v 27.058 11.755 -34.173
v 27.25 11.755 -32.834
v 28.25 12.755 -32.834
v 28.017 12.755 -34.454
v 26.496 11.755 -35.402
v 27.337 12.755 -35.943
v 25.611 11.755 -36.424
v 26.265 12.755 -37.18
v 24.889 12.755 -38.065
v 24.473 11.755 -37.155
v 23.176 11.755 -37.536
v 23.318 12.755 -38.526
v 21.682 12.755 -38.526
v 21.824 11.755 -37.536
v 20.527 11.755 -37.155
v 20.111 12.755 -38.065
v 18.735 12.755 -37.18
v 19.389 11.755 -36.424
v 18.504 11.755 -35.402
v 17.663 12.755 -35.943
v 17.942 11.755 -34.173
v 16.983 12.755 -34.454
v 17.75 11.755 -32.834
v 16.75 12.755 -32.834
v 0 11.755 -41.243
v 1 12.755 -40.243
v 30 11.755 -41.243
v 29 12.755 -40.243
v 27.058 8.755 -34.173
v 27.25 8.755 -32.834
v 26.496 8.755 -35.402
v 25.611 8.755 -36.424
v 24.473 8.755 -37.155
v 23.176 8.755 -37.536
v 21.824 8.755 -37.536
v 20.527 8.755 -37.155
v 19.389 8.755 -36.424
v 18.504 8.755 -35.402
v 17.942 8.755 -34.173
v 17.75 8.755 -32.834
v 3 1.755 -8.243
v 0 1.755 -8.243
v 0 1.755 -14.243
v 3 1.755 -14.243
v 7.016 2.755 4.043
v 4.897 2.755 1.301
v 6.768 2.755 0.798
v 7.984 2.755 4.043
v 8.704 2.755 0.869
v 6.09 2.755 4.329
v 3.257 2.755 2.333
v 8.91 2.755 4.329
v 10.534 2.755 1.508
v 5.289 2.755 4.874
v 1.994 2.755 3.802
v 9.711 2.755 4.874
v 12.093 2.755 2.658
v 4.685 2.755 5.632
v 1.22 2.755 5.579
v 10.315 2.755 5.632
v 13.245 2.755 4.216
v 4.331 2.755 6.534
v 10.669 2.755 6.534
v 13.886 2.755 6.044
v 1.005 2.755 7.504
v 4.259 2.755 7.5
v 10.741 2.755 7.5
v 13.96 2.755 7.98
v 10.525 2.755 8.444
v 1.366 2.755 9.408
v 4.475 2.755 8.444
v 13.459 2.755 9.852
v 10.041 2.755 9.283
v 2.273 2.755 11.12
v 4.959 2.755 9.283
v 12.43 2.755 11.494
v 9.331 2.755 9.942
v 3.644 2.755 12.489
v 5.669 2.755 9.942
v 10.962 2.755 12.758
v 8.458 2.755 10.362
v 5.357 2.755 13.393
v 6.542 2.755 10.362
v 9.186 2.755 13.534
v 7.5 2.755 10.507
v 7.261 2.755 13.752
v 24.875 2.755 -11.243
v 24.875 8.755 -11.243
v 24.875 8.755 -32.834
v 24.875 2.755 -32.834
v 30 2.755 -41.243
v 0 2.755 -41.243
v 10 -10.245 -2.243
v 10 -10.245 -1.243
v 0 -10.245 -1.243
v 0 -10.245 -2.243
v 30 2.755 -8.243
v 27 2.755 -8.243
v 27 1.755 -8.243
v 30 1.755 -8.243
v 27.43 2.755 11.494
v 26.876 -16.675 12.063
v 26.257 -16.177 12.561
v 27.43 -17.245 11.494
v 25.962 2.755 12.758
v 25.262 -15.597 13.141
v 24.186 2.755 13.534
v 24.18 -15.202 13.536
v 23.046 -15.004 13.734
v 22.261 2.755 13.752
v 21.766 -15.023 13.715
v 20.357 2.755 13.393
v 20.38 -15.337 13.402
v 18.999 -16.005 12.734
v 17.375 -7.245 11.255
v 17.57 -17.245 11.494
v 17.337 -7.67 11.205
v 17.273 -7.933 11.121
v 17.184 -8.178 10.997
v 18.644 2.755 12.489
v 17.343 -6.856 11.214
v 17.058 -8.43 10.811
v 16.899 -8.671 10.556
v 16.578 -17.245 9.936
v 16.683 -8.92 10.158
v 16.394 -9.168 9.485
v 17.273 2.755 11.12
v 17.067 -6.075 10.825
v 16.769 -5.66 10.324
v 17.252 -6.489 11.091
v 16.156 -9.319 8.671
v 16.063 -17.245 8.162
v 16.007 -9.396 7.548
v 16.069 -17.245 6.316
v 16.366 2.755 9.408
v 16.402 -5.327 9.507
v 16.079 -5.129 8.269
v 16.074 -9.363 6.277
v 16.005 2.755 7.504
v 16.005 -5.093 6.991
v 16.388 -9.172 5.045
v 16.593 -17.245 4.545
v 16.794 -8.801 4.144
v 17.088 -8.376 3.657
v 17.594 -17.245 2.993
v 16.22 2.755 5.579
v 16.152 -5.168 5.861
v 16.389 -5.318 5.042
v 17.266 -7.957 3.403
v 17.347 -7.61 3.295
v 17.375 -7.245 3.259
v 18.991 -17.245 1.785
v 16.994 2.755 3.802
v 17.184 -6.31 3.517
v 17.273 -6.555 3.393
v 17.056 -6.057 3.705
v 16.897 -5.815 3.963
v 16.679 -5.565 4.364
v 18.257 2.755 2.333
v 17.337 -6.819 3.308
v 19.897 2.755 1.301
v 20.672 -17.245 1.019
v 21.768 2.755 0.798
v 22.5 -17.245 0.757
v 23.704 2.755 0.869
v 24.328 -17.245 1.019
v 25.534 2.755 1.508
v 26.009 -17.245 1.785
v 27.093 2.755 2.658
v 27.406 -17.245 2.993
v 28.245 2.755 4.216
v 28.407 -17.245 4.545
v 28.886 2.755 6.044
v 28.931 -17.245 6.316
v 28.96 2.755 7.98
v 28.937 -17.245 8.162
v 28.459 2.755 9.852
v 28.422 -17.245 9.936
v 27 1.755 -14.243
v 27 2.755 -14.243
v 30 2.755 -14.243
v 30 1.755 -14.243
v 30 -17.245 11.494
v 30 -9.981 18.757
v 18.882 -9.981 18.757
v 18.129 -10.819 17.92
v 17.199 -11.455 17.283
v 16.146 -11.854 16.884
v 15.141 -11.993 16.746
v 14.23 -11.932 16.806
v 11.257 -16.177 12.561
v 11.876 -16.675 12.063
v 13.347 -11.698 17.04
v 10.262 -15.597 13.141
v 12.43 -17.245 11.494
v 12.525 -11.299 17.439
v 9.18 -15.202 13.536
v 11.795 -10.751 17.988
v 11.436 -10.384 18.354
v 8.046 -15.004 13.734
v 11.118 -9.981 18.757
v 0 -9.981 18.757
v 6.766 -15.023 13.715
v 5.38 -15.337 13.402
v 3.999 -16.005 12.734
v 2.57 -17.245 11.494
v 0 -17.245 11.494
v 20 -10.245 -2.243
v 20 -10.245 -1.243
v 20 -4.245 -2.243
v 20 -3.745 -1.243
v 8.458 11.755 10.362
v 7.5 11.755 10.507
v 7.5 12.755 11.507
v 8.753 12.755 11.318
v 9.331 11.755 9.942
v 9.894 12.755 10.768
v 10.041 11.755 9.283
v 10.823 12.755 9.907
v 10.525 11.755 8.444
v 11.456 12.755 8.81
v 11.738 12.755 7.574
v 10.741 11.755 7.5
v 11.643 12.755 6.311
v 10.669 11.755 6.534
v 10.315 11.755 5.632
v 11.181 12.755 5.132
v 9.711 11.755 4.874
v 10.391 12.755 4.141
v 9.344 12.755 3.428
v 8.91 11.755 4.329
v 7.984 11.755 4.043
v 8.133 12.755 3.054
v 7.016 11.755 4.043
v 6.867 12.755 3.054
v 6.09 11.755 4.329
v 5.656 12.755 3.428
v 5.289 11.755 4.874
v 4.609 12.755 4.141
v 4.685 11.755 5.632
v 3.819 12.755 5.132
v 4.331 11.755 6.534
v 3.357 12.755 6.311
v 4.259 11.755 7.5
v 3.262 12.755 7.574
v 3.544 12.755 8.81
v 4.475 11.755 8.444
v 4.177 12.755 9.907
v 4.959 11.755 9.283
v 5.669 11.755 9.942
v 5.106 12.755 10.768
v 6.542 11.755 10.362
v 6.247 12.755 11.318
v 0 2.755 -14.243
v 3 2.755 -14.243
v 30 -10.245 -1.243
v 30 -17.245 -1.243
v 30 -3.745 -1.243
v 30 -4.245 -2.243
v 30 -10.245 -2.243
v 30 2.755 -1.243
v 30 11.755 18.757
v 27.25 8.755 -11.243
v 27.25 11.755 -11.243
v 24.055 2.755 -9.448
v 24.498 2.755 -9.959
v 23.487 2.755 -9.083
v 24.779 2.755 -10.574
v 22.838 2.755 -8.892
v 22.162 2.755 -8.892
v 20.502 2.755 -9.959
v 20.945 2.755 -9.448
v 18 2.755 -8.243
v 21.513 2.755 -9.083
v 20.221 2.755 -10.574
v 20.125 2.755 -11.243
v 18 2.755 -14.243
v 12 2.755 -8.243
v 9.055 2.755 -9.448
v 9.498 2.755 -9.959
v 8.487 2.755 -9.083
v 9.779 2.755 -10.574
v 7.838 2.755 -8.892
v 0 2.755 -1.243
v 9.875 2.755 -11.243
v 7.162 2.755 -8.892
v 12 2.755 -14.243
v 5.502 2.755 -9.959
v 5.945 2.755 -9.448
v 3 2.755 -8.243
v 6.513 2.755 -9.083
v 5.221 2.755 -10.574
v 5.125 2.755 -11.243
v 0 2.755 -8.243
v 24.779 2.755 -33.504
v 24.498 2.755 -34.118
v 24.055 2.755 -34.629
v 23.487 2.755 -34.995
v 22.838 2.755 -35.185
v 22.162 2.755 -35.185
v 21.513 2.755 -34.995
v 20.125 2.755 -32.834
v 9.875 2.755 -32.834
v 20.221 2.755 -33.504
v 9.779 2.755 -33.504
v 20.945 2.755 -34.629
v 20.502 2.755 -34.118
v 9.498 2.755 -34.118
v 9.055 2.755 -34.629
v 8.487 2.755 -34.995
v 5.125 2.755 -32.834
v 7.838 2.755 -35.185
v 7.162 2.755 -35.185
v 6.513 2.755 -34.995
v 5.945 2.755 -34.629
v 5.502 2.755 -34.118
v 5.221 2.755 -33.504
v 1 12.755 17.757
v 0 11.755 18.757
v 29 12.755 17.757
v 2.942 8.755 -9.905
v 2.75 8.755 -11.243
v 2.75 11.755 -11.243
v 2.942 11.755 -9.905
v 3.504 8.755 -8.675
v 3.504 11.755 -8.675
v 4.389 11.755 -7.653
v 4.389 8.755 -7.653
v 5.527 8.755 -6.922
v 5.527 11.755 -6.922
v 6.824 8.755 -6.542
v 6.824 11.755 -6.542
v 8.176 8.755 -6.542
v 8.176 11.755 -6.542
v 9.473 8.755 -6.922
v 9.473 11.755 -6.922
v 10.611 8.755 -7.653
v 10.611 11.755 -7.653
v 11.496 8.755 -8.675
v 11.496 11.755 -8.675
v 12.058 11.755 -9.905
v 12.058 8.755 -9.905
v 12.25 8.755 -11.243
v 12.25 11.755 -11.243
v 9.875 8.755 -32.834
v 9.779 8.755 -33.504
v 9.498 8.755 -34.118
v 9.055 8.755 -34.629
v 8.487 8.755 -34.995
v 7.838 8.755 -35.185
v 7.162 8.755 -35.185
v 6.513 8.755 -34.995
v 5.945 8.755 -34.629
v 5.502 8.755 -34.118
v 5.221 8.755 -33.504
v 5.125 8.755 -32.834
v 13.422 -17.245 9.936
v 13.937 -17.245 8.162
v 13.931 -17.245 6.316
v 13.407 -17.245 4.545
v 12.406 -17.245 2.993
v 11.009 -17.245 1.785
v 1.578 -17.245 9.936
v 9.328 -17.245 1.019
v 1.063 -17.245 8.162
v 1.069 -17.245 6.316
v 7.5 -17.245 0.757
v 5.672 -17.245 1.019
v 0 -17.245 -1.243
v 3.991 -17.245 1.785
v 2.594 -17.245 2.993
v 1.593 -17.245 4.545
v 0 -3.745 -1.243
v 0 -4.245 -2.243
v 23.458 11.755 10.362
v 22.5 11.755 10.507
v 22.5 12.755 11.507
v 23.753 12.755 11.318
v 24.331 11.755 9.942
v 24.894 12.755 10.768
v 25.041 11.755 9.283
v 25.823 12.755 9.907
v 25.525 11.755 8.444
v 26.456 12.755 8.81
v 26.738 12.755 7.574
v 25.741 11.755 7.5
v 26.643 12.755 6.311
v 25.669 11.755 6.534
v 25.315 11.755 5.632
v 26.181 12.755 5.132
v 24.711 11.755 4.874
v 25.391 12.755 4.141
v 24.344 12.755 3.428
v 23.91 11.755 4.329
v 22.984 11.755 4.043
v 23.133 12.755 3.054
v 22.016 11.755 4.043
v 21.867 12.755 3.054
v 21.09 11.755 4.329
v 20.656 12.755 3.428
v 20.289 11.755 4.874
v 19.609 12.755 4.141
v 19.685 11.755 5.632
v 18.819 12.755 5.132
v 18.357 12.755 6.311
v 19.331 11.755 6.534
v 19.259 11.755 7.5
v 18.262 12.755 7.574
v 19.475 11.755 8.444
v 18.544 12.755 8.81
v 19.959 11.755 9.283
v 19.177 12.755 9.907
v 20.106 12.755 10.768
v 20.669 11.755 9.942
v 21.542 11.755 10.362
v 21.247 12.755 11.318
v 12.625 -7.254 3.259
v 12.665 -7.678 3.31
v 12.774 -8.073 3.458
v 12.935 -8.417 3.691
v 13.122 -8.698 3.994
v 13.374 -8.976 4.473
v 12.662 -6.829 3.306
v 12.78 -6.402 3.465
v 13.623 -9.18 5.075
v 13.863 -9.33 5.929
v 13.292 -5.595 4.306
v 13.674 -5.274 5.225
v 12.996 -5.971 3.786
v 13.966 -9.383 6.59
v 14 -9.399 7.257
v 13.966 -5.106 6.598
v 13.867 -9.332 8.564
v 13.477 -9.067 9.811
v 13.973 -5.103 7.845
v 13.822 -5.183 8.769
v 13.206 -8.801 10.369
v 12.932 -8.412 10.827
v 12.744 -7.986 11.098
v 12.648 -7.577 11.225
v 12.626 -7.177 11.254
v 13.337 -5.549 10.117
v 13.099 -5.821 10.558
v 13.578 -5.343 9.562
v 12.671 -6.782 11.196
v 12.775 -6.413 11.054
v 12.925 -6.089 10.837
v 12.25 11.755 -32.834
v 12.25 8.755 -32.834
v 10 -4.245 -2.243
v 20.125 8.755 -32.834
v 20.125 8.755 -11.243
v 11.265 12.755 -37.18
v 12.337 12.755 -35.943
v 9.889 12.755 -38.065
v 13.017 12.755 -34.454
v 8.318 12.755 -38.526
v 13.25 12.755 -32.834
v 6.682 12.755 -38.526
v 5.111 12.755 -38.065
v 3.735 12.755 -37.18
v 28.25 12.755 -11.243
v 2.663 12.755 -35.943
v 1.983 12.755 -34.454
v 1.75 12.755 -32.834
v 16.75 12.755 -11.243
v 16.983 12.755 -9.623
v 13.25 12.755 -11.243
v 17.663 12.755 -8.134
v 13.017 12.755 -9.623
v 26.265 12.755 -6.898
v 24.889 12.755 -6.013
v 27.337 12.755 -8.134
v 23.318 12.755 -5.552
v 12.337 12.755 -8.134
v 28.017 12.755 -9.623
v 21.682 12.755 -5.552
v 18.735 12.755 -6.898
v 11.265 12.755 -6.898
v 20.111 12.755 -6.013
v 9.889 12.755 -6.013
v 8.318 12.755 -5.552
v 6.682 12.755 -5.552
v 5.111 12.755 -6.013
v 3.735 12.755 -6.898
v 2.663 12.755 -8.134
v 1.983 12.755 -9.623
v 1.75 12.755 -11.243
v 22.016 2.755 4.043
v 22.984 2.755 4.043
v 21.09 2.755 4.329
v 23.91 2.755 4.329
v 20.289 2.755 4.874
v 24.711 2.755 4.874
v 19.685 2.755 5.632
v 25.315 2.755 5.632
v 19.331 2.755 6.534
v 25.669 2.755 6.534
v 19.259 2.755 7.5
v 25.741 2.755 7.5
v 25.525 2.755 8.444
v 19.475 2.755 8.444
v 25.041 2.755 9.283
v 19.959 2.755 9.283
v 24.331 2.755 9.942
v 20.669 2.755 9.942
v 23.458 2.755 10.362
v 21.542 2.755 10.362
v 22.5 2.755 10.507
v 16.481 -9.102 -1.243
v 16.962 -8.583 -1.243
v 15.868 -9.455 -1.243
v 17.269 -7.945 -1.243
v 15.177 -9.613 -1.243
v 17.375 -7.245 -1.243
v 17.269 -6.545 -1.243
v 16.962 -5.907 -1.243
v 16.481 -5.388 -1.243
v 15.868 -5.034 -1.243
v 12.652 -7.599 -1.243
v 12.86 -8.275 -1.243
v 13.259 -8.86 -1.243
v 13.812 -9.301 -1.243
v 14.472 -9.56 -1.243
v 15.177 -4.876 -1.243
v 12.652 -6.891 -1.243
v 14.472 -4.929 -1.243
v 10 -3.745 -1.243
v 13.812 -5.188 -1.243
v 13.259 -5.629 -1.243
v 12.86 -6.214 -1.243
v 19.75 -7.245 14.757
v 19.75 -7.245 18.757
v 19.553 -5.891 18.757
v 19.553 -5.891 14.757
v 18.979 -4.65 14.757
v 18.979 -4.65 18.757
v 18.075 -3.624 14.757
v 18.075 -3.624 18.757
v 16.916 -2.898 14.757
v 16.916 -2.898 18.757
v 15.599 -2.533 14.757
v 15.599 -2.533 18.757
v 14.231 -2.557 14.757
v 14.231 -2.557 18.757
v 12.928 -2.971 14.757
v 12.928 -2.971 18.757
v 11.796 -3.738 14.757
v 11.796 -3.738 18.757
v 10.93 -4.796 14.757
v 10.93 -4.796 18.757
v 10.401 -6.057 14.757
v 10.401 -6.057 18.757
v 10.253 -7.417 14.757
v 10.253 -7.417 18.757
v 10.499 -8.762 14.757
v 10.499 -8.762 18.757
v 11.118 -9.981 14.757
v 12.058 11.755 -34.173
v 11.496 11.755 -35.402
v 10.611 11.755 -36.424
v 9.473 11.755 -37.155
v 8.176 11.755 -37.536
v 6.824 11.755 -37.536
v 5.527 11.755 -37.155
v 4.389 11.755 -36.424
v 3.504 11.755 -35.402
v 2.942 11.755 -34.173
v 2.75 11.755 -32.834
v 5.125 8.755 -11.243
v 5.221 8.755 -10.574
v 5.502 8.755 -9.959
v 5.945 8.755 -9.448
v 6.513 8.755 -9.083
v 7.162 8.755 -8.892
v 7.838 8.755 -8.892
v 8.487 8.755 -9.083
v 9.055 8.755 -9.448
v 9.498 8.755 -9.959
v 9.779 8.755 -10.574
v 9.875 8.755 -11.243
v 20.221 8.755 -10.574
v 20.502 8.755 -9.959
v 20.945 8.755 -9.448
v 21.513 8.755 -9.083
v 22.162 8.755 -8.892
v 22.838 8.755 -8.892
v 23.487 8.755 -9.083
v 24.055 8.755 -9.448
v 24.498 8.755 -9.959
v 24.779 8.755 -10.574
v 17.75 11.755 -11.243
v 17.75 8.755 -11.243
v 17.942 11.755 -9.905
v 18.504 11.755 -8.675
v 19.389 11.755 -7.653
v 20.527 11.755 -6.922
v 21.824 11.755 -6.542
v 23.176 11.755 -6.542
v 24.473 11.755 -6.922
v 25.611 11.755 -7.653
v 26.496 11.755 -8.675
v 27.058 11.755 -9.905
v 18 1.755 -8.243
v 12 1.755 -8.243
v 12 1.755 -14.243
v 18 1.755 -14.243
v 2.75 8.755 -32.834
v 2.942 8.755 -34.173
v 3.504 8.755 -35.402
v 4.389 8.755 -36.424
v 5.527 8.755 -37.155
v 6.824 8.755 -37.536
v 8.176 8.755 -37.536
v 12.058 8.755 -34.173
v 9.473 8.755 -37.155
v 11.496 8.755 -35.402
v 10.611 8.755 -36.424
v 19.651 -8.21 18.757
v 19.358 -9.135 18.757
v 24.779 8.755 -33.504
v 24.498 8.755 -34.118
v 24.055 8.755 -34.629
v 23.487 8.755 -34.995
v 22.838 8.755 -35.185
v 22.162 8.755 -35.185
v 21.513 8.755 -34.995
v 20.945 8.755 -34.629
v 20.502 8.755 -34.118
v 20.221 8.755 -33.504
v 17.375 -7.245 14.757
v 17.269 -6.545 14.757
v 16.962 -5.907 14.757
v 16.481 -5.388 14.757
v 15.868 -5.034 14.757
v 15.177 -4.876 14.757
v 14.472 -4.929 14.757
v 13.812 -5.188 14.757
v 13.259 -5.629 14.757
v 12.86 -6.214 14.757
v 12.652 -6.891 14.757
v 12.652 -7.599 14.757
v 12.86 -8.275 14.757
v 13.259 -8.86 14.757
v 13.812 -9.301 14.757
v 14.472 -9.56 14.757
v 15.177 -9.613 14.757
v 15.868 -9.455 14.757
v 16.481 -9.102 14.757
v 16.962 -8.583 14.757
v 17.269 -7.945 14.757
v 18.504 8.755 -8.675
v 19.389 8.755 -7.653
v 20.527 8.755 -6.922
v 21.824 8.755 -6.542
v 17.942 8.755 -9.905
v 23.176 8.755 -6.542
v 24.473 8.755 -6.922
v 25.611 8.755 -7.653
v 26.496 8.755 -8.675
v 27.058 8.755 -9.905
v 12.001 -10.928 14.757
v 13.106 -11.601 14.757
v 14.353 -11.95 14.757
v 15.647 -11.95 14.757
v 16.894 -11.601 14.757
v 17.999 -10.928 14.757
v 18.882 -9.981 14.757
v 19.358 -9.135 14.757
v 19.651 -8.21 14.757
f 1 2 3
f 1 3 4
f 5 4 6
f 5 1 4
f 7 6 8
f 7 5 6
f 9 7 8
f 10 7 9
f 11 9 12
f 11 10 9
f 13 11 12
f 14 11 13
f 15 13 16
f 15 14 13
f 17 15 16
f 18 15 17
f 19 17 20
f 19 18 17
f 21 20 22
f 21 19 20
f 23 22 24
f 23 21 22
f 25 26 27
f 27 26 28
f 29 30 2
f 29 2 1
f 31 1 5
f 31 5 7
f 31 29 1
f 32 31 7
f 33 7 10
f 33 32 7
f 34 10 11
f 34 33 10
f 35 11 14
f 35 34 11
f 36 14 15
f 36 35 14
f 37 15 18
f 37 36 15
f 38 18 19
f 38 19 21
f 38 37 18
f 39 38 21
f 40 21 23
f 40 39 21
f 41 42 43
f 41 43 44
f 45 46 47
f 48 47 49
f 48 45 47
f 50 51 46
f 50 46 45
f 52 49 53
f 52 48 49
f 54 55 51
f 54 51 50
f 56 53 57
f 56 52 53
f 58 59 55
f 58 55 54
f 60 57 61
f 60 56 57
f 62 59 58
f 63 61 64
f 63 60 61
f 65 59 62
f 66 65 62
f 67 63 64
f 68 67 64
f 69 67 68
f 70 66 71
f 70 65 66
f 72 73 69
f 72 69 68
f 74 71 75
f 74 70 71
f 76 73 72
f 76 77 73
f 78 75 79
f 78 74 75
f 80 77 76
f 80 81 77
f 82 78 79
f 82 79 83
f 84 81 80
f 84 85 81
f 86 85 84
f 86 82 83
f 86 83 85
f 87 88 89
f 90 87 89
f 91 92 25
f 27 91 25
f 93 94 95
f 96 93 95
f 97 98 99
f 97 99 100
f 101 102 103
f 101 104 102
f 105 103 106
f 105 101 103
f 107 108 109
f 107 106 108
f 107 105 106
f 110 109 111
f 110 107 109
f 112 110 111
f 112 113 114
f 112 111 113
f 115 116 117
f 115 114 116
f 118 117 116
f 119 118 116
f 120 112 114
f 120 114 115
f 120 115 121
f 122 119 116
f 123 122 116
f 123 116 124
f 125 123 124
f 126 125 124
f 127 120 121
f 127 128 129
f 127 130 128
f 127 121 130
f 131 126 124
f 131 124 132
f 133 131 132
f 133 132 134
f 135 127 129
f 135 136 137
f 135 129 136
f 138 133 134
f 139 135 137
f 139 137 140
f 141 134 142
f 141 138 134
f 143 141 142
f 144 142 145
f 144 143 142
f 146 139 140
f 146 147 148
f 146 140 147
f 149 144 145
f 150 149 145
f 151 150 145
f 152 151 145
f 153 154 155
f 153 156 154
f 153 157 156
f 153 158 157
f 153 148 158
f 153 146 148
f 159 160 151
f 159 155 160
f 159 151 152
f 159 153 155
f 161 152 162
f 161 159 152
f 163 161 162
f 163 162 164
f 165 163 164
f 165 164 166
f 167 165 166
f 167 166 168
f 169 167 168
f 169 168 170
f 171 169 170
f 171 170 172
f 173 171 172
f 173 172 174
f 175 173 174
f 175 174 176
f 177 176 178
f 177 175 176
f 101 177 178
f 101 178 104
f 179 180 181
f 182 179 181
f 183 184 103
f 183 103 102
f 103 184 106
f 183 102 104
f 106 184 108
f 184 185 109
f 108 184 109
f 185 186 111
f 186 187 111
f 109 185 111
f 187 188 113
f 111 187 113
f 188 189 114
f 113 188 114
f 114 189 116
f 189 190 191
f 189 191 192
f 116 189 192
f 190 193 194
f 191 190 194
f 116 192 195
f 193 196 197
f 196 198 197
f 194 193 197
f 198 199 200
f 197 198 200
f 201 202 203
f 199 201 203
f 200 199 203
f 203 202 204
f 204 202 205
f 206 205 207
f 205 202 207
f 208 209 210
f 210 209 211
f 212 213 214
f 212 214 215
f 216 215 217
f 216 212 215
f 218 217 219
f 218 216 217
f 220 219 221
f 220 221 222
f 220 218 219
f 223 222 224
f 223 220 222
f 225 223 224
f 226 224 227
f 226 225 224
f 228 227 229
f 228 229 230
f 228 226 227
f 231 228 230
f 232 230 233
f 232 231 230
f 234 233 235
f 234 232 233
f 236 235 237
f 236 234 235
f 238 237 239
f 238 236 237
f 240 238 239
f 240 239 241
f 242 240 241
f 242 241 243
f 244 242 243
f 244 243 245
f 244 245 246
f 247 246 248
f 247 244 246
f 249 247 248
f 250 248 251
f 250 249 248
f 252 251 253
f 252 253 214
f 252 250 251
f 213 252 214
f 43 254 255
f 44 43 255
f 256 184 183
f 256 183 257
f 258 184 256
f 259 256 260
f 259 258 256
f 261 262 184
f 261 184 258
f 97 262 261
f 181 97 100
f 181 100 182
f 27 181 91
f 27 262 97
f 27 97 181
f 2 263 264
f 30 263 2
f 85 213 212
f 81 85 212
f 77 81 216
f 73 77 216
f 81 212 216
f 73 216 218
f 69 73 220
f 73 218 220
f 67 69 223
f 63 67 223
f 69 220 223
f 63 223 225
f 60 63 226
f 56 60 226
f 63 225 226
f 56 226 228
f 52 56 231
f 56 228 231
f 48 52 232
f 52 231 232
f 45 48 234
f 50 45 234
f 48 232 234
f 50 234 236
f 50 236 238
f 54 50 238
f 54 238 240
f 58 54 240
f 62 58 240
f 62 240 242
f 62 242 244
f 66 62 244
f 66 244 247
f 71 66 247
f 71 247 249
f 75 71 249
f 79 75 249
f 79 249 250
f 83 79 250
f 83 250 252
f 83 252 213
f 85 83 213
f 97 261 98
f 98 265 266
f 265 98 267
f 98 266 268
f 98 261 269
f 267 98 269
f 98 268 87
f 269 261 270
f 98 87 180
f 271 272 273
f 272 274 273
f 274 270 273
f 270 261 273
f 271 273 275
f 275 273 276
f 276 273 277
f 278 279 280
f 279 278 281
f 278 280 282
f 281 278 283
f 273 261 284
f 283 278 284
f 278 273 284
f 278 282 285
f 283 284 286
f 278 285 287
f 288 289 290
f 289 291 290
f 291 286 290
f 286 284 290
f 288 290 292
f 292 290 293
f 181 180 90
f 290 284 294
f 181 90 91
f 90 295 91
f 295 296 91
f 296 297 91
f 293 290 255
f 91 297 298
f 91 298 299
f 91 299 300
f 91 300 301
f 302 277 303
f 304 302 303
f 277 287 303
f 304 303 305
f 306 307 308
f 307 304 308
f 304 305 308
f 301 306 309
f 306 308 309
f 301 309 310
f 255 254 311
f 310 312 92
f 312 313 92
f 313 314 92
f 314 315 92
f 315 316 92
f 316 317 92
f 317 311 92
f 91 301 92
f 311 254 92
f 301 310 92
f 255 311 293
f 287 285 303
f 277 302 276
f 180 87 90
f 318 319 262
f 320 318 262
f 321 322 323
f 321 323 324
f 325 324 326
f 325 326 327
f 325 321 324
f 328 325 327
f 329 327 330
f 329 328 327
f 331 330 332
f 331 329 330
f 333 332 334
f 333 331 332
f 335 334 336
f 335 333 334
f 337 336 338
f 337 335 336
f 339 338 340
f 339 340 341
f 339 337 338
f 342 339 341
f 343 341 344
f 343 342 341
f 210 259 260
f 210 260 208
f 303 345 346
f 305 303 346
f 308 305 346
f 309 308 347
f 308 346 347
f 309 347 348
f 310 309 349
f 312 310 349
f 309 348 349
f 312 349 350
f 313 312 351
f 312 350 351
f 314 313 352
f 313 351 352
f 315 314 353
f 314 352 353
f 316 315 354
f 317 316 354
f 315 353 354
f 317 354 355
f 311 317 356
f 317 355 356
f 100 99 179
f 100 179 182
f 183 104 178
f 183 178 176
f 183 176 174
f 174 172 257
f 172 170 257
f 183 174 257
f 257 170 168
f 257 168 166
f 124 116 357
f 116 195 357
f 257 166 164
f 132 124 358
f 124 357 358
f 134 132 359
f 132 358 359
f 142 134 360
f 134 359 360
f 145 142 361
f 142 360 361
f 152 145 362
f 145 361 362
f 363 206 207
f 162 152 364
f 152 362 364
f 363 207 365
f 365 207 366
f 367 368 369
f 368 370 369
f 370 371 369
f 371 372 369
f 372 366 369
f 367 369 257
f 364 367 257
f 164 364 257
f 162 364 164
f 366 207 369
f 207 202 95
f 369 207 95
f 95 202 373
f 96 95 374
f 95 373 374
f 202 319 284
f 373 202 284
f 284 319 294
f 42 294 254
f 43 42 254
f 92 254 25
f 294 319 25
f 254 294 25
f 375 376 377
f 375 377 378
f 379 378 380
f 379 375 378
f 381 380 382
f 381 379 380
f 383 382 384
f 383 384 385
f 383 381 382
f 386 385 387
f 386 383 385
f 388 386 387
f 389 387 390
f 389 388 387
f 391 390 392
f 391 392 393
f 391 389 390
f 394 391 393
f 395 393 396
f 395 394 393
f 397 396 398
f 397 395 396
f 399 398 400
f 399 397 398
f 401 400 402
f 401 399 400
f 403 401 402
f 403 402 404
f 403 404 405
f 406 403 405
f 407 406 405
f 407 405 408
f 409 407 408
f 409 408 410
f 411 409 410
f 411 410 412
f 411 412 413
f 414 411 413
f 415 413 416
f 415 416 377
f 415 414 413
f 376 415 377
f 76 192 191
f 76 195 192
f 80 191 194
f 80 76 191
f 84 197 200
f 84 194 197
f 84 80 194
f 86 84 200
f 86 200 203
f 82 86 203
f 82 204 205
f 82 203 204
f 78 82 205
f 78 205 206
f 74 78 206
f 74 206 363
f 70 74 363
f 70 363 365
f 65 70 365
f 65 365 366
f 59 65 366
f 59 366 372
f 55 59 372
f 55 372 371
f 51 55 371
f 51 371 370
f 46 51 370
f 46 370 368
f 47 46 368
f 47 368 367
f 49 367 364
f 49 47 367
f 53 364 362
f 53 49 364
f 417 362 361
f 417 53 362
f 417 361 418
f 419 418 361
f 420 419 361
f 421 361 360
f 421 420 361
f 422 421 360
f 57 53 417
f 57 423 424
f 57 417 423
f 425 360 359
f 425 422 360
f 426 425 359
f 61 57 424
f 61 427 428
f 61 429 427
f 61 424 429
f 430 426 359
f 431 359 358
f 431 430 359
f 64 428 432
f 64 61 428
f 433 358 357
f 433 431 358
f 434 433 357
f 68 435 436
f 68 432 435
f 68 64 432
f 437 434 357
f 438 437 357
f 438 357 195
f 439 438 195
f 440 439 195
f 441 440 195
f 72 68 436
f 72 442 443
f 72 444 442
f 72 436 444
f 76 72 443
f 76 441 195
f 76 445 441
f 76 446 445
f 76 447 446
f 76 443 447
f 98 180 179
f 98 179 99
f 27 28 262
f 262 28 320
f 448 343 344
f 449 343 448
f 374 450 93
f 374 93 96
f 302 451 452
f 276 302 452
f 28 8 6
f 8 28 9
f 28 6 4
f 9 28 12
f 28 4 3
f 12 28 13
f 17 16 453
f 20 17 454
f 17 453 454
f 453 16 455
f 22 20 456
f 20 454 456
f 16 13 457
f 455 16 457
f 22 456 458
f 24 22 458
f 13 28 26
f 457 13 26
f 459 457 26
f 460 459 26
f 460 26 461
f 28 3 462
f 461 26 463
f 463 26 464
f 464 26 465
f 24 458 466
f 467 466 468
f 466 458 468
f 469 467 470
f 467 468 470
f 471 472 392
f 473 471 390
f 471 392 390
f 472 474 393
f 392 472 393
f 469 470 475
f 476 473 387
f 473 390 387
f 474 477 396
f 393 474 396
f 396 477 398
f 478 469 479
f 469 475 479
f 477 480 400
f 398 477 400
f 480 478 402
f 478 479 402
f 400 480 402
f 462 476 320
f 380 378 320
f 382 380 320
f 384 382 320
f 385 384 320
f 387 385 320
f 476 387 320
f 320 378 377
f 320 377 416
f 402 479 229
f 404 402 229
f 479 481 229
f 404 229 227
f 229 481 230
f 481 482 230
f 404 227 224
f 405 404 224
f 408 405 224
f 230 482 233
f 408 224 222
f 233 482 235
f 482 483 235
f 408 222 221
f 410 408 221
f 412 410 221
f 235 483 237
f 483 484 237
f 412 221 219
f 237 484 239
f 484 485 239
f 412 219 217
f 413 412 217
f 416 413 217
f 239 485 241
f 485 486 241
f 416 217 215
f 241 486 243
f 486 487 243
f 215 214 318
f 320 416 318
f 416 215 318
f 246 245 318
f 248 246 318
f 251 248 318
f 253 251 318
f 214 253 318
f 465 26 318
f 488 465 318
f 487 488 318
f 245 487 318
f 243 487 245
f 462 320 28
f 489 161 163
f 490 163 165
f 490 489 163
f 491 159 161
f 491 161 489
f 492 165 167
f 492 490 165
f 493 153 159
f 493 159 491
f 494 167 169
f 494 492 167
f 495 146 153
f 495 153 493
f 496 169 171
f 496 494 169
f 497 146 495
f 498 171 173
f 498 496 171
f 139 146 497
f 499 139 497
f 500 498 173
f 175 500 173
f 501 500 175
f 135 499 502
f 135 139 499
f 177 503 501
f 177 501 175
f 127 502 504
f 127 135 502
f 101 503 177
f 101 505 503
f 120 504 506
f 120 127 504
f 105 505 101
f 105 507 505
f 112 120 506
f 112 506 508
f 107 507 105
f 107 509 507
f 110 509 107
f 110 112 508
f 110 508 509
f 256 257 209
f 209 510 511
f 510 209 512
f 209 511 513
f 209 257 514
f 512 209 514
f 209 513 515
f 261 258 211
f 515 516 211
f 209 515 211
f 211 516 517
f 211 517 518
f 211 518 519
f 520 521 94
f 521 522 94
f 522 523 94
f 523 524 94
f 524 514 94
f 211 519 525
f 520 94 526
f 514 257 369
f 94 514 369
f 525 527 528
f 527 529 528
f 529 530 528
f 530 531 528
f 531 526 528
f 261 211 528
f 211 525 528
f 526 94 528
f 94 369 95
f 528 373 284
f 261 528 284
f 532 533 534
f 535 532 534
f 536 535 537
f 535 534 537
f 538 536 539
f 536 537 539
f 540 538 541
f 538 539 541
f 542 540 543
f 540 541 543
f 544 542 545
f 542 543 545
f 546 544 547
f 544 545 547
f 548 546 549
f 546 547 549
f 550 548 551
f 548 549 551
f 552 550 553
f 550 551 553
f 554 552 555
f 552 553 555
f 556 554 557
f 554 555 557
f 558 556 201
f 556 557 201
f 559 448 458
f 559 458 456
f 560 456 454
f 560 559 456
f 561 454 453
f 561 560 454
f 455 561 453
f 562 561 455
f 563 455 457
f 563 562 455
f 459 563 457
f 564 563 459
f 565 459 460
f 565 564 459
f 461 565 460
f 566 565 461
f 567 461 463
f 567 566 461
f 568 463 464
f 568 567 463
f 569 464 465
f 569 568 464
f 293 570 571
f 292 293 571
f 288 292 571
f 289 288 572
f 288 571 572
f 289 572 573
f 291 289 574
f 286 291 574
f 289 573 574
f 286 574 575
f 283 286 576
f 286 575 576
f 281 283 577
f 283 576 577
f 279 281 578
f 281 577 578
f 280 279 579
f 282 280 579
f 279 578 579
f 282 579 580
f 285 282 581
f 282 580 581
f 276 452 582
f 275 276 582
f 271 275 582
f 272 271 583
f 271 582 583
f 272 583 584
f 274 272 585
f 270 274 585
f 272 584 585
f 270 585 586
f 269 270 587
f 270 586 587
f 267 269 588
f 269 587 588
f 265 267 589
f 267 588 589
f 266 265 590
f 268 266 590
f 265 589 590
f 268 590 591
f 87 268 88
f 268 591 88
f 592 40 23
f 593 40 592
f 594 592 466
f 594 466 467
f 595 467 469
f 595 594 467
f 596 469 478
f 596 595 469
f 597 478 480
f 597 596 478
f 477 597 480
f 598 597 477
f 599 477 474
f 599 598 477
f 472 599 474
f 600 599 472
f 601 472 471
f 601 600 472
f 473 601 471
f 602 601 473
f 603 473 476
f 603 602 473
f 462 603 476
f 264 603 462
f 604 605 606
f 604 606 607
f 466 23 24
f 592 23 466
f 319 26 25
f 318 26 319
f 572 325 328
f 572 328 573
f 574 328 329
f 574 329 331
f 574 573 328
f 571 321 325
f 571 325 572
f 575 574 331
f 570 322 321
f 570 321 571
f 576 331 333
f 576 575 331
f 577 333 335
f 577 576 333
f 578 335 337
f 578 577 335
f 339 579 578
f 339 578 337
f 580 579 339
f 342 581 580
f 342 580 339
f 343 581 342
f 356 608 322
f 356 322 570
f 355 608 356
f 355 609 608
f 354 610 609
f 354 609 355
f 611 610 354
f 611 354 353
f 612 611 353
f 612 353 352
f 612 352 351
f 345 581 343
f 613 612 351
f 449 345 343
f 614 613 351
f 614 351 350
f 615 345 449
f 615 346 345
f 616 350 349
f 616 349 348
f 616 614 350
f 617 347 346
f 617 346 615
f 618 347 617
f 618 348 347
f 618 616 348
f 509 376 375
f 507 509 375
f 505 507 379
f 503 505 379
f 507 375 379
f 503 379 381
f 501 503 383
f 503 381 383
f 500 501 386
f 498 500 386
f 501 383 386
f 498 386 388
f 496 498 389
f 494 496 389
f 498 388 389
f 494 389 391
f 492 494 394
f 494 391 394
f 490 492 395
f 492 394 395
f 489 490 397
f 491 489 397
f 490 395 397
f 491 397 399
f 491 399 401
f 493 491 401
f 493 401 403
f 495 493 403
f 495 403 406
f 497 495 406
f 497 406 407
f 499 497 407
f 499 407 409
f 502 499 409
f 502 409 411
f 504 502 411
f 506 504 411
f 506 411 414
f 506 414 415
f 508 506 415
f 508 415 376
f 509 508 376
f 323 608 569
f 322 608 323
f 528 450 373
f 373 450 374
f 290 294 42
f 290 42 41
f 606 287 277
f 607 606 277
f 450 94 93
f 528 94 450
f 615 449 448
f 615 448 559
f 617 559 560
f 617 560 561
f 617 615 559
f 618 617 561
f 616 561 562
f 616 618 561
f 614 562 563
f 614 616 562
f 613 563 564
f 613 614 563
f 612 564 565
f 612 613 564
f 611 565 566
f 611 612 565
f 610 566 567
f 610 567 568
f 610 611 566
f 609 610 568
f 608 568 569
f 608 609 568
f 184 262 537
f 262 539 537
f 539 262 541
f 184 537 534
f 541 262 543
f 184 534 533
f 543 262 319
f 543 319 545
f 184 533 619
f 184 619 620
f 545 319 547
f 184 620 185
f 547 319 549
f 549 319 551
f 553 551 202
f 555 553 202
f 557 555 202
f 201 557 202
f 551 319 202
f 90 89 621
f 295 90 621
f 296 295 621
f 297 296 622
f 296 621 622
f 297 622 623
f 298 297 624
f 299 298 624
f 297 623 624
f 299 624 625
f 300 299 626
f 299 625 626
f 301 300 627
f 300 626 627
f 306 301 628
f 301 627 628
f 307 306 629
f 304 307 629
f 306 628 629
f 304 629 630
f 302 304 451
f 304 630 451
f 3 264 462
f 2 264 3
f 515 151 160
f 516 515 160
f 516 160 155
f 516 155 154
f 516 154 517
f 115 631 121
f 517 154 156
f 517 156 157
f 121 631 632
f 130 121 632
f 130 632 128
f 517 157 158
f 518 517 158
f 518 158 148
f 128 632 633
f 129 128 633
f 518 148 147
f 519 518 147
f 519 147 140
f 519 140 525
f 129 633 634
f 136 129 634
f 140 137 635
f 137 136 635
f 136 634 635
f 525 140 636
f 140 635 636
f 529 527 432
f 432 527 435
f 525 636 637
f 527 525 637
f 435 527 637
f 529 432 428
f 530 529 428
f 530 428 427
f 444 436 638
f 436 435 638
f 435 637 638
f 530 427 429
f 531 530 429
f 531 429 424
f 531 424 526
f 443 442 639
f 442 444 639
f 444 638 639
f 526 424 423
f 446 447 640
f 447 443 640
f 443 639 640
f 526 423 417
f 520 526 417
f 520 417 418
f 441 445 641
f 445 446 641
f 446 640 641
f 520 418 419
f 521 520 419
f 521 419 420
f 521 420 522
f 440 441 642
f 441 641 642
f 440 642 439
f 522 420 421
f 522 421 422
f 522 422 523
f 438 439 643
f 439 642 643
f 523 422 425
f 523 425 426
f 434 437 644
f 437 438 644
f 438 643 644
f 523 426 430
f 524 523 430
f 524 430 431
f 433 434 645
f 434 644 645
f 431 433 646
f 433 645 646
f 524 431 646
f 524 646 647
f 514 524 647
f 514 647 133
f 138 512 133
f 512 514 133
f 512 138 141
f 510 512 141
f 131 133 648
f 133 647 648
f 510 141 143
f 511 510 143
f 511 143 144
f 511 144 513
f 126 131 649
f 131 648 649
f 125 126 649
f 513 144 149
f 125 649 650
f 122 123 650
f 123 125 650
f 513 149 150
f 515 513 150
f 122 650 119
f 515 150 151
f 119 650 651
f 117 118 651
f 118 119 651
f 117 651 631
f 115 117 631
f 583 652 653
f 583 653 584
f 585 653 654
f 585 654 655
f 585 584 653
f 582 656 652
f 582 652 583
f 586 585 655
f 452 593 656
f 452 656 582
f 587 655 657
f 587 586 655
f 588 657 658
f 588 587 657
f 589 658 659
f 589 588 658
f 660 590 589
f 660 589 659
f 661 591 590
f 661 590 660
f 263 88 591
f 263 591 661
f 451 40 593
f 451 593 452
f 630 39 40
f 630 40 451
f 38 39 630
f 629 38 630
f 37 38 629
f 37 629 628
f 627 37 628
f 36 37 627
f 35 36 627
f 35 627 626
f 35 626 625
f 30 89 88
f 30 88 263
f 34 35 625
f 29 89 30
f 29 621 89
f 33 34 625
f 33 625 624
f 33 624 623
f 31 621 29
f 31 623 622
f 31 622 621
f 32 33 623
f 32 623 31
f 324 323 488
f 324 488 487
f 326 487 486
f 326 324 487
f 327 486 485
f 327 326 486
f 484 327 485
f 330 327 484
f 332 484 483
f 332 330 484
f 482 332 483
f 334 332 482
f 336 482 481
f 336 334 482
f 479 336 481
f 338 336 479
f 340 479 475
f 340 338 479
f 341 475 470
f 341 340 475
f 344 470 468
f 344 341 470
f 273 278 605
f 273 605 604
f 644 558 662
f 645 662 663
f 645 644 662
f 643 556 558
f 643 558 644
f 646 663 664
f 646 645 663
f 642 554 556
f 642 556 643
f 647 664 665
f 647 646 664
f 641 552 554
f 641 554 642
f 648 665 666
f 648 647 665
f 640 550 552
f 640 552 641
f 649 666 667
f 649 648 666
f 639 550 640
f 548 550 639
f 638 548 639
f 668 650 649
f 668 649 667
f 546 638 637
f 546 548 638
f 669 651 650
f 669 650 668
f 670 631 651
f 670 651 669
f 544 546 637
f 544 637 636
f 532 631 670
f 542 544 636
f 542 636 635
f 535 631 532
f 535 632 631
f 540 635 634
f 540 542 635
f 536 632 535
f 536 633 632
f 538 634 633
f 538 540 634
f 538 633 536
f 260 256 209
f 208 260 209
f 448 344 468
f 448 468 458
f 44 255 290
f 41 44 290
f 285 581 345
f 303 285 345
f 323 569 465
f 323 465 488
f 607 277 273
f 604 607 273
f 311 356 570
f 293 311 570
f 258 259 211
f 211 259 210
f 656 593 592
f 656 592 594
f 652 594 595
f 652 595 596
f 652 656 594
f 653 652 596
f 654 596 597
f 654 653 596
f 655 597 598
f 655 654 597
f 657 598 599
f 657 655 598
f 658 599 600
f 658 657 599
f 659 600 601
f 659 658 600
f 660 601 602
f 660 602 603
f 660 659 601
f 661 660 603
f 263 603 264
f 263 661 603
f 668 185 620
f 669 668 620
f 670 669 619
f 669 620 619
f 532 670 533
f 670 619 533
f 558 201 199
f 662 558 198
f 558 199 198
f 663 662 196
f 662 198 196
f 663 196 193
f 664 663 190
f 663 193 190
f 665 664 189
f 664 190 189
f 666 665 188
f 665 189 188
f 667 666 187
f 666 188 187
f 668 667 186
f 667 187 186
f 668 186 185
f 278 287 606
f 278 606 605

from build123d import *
from OCP.BRepFilletAPI import BRepFilletAPI_MakeChamfer

# Parameters (mm, degrees)
RESSALTO_EXTRUS_O1_DEPTH = 30
CORTE_EXTRUS_O1_REACH    = 61.169
ESBO_O2_R                = 3.25
CORTE_EXTRUS_O3_START    = 8.755336939
CORTE_EXTRUS_O3_DEPTH    = 4
CORTE_EXTRUS_O2_REACH    = 71.263
ESBO_O3_R                = 2.375
ESBO_O3_3_R              = 2.375
CORTE_EXTRUS_O4_DEPTH    = 4
ESBO_O4_W                = 6
ESBO_O4_H                = 6
ESBO_O4_W_2              = 3
RESSALTO_EXTRUS_O2_DEPTH = 1
ESBO_O5_R                = 6.5
CORTE_EXTRUS_O5_DEPTH    = 55.781368683
CHANFRO1_SIZE            = 1
ESBO_O6_W                = 10
ESBO_O6_H                = 6
RESSALTO_EXTRUS_O3_DEPTH = 1
CHANFRO2_SIZE            = 0.5
CHANFRO2_SIZE_2          = 1


# Read off the part's stored shape, not the designer's step: Corte-extrusão3
with BuildPart() as part:
    # Esboço1 → Ressalto-extrusão1 (new body)
    with BuildSketch(Plane(origin=(0, 0, 0), x_dir=(0, 0, -1), z_dir=(1, 0, 0))):
        Polygon((1.243161309, 2.755336939), (41.243161309, 2.755336939), (41.243161309, 12.755336939), (-18.756838691, 12.755336939), (-18.756838691, -9.981327227), (-11.493502857, -17.244663061), (1.243161309, -17.244663061), align=None)
    extrude(amount=RESSALTO_EXTRUS_O1_DEPTH)

    # Esboço2 → Corte-extrusão1 (cut, up to next)
    with BuildSketch(Plane(origin=(0, 12.755336939, 0), x_dir=(1, 0, 0), z_dir=(0, 1, 0)), mode=Mode.PRIVATE) as corte_extrus_o1_sk1:
        with BuildLine():
            Line((5.125, 32.834447928), (5.125, 11.243161309))
            ThreePointArc((5.125, 11.243161309), (7.5, 8.868161309), (9.875, 11.243161309))
            Line((9.875, 11.243161309), (9.875, 32.834447928))
            ThreePointArc((9.875, 32.834447928), (7.5, 35.209447928), (5.125, 32.834447928))
        make_face()
    corte_extrus_o1_tool1 = extrude(corte_extrus_o1_sk1.sketch, amount=-CORTE_EXTRUS_O1_REACH, mode=Mode.PRIVATE) & part.part
    # Esboço2 → Corte-extrusão1 (cut, up to next)
    with BuildSketch(Plane(origin=(0, 12.755336939, 0), x_dir=(1, 0, 0), z_dir=(0, 1, 0)), mode=Mode.PRIVATE) as corte_extrus_o1_sk2:
        with BuildLine():
            Line((20.125, 32.834447928), (20.125, 11.243161309))
            ThreePointArc((20.125, 11.243161309), (22.5, 8.868161309), (24.875, 11.243161309))
            Line((24.875, 11.243161309), (24.875, 32.834447928))
            ThreePointArc((24.875, 32.834447928), (22.5, 35.209447928), (20.125, 32.834447928))
        make_face()
    corte_extrus_o1_tool2 = extrude(corte_extrus_o1_sk2.sketch, amount=-CORTE_EXTRUS_O1_REACH, mode=Mode.PRIVATE) & part.part
    # Esboço2 → Corte-extrusão1 (cut, up to next)
    with BuildSketch(Plane(origin=(0, 12.755336939, 0), x_dir=(1, 0, 0), z_dir=(0, 1, 0)), mode=Mode.PRIVATE) as corte_extrus_o1_sk3:
        with Locations(Location((7.5, -7.256838691, 0), (0, 0, 270))):
            Circle(ESBO_O2_R)
    corte_extrus_o1_tool3 = extrude(corte_extrus_o1_sk3.sketch, amount=-CORTE_EXTRUS_O1_REACH, mode=Mode.PRIVATE) & part.part
    # Esboço2 → Corte-extrusão1 (cut, up to next)
    with BuildSketch(Plane(origin=(0, 12.755336939, 0), x_dir=(1, 0, 0), z_dir=(0, 1, 0)), mode=Mode.PRIVATE) as corte_extrus_o1_sk4:
        with Locations(Location((22.5, -7.256838691, 0), (0, 0, 270))):
            Circle(ESBO_O2_R)
    corte_extrus_o1_tool4 = extrude(corte_extrus_o1_sk4.sketch, amount=-CORTE_EXTRUS_O1_REACH, mode=Mode.PRIVATE) & part.part
    add(corte_extrus_o1_tool1.solids().sort_by_distance((7.5, 12.755337, -22.038805))[0], mode=Mode.SUBTRACT)
    add(corte_extrus_o1_tool2.solids().sort_by_distance((22.5, 12.755337, -22.038805))[0], mode=Mode.SUBTRACT)
    add(corte_extrus_o1_tool3.solids().sort_by_distance((7.5, 12.755337, 7.256839))[0], mode=Mode.SUBTRACT)
    add(corte_extrus_o1_tool4.solids().sort_by_distance((22.5, 12.755337, 7.256839))[0], mode=Mode.SUBTRACT)

    # Corte-extrusão3 outline → Corte-extrusão3 (cut)
    # profile 1 of 2: a face of its own
    with BuildSketch(Plane(origin=(0, 0, 0), x_dir=(1, 0, 0), z_dir=(0, 1, 0)).offset(CORTE_EXTRUS_O3_START)):
        with BuildLine():
            ThreePointArc((2.75, 11.243161309), (7.5, 6.493161309), (12.25, 11.243161309))
            Line((12.25, 11.243161309), (12.25, 32.834447928))
            ThreePointArc((12.25, 32.834447928), (7.5, 37.584447928), (2.75, 32.834447928))
            Line((2.75, 32.834447928), (2.75, 11.243161309))
        make_face()
        with BuildLine():
            ThreePointArc((5.125, 32.834447928), (7.5, 35.209447928), (9.875, 32.834447928))
            Line((9.875, 32.834447928), (9.875, 11.243161309))
            ThreePointArc((9.875, 11.243161309), (7.5, 8.868161309), (5.125, 11.243161309))
            Line((5.125, 11.243161309), (5.125, 32.834447928))
        make_face(mode=Mode.SUBTRACT)
    # profile 2 of 2: a face of its own
    with BuildSketch(Plane(origin=(0, 0, 0), x_dir=(1, 0, 0), z_dir=(0, 1, 0)).offset(CORTE_EXTRUS_O3_START)):
        with BuildLine():
            ThreePointArc((17.75, 11.243161309), (22.5, 6.493161309), (27.25, 11.243161309))
            Line((27.25, 11.243161309), (27.25, 32.834447928))
            ThreePointArc((27.25, 32.834447928), (22.5, 37.584447928), (17.75, 32.834447928))
            Line((17.75, 32.834447928), (17.75, 11.243161309))
        make_face()
        with BuildLine():
            Line((20.125, 11.243161309), (20.125, 32.834447928))
            ThreePointArc((20.125, 32.834447928), (22.5, 35.209447928), (24.875, 32.834447928))
            Line((24.875, 32.834447928), (24.875, 11.243161309))
            ThreePointArc((24.875, 11.243161309), (22.5, 8.868161309), (20.125, 11.243161309))
        make_face(mode=Mode.SUBTRACT)
    extrude(amount=CORTE_EXTRUS_O3_DEPTH, mode=Mode.SUBTRACT)

    # Esboço3 → Corte-extrusão2 (cut, up to next)
    with BuildSketch(Plane.XY.offset(18.756838691), mode=Mode.PRIVATE) as corte_extrus_o2_sk1:
        with Locations((15, -7.244663061)):
            Circle(ESBO_O3_R)
    corte_extrus_o2_tool1 = extrude(corte_extrus_o2_sk1.sketch, amount=-CORTE_EXTRUS_O2_REACH, mode=Mode.PRIVATE) & part.part
    add(corte_extrus_o2_tool1.solids().sort_by_distance((15, -7.244663, 18.756839))[0], mode=Mode.SUBTRACT)

    # Esboço3<3> → Corte-extrusão4 (cut)
    # profile 1 of 2: a face of its own
    with BuildSketch(Plane.XY.offset(18.756838691)):
        with BuildLine():
            Line((18.882417963, -9.981327227), (11.117582037, -9.981327227))
            ThreePointArc((11.117582037, -9.981327227), (15, -11.994663061), (18.882417963, -9.981327227))
        make_face()
    # profile 2 of 2: a face of its own
    with BuildSketch(Plane.XY.offset(18.756838691)):
        with BuildLine():
            ThreePointArc((18.882417963, -9.981327227), (19.527912617, -8.680109799), (19.75, -7.244663061))
            ThreePointArc((19.75, -7.244663061), (13.564553262, -2.716750444), (11.117582037, -9.981327227))
            Line((11.117582037, -9.981327227), (18.882417963, -9.981327227))
        make_face()
        with Locations((15, -7.244663061)):
            Circle(ESBO_O3_3_R, mode=Mode.SUBTRACT)
    extrude(amount=-CORTE_EXTRUS_O4_DEPTH, mode=Mode.SUBTRACT)

    # Esboço4 → Ressalto-extrusão2 (add)
    with BuildSketch(Plane.XZ.offset(-2.755336939)):
        with Locations((15, -11.243161309)):
            Rectangle(ESBO_O4_W, ESBO_O4_H)
        with Locations((1.5, -11.243161309)):
            Rectangle(ESBO_O4_W_2, ESBO_O4_H)
        with Locations((28.5, -11.243161309)):
            Rectangle(ESBO_O4_W_2, ESBO_O4_H)
    extrude(amount=RESSALTO_EXTRUS_O2_DEPTH)

    # Esboço5 → Corte-extrusão5 (cut, through all)
    with BuildSketch(Plane.XZ.offset(-2.755336939)):
        with Locations(Location((7.5, 7.256838691, 0), (0, 0, 40.677035539))):
            Circle(ESBO_O5_R)
        with Locations(Location((22.5, 7.256838691, 0), (0, 0, 40.677035539))):
            Circle(ESBO_O5_R)
    extrude(amount=CORTE_EXTRUS_O5_DEPTH, mode=Mode.SUBTRACT)

    # Chanfro1
    chanfro1_edges = [part.edges().sort_by_distance(p)[0] for p in [
        (27.25, 12.755336939, -22.038804619),
        (22.5, 12.755336939, -37.584447928),
        (17.75, 12.755336939, -22.038804619),
        (22.5, 12.755336939, -6.493161309),
        (15, 12.755336939, 18.756838691),
        (15, 12.755336939, -41.243161309),
        (30, 12.755336939, -11.243161309),
        (7.5, 12.755336939, 4.006838691),
        (22.5, 12.755336939, 4.006838691),
        (12.25, 12.755336939, -22.038804619),
        (7.5, 12.755336939, -37.584447928),
        (2.75, 12.755336939, -22.038804619),
        (7.5, 12.755336939, -6.493161309),
        (0, 12.755336939, -11.243161309),
    ]]
    chamfer(chanfro1_edges, length=CHANFRO1_SIZE)

    # Esboço6 → Ressalto-extrusão3 (add)
    with BuildSketch(Plane(origin=(0, 0, -1.243161309), x_dir=(-1, 0, 0), z_dir=(0, 0, -1))):
        with Locations((-25, -7.244663061)):
            Rectangle(ESBO_O6_W, ESBO_O6_H)
        with Locations((-5, -7.244663061)):
            Rectangle(ESBO_O6_W, ESBO_O6_H)
    extrude(amount=RESSALTO_EXTRUS_O3_DEPTH)

    # Chanfro2
    chanfro2_edges_1 = [part.edges().sort_by_distance(p)[0] for p in [
        (25, -4.244663061, -1.243161309),
    ]]
    chanfro2_side_1 = [part.faces().sort_by_distance(p)[0] for p in [
        (25, -4.234663061, -1.243161309),
    ]]
    chanfro2_edges_2 = [part.edges().sort_by_distance(p)[0] for p in [
        (5, -4.244663061, -1.243161309),
    ]]
    chanfro2_side_2 = [part.faces().sort_by_distance(p)[0] for p in [
        (5, -4.234663061, -1.243161309),
    ]]
    chanfro2 = BRepFilletAPI_MakeChamfer(part.part.solid().wrapped)
    for e in chanfro2_edges_1:
        chanfro2.Add(CHANFRO2_SIZE - 0.0001, CHANFRO2_SIZE_2 - 0.0001, e.wrapped, chanfro2_side_1[0].wrapped)
    for e in chanfro2_edges_2:
        chanfro2.Add(CHANFRO2_SIZE - 0.0001, CHANFRO2_SIZE_2 - 0.0001, e.wrapped, chanfro2_side_2[0].wrapped)
    add(Compound.cast(chanfro2.Shape()), mode=Mode.REPLACE)  # a hair under: the kernel refuses the full size


solid = part.part
